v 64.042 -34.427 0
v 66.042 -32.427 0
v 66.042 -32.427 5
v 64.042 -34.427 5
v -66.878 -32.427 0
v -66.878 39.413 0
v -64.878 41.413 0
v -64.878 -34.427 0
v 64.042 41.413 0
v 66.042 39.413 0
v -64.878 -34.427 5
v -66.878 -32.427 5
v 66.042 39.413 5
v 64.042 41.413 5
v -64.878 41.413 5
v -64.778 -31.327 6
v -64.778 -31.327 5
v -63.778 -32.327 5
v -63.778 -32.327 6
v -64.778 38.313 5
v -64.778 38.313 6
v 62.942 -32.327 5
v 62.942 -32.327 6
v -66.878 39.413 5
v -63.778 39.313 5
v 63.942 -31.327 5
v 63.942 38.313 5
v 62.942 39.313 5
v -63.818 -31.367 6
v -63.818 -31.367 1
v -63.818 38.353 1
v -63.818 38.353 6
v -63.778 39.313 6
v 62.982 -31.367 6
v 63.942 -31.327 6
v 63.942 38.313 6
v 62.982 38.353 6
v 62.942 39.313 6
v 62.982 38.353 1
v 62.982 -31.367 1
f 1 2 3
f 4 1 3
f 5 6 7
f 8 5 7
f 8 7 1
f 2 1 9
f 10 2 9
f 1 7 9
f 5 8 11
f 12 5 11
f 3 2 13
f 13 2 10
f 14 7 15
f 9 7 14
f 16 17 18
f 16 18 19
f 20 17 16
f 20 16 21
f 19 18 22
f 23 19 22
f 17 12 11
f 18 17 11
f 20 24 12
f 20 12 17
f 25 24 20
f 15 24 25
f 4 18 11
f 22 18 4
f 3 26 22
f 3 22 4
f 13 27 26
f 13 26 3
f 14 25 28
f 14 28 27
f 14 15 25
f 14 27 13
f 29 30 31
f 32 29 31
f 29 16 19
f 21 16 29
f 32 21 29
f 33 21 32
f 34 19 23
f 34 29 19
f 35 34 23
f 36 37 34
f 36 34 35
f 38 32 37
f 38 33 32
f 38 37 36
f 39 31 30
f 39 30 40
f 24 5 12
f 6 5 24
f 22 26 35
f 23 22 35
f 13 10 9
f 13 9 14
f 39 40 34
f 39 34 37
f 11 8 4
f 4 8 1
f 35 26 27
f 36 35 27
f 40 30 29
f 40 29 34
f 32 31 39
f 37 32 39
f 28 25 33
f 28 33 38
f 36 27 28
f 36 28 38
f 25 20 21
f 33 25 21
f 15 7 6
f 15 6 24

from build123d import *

# Parameters (mm, degrees)
F0_W     = 128.72
F0_H     = 71.64
F0_W_2   = 126.8
F0_H_2   = 69.72
F1_DEPTH = 6
F0_W_3   = 132.92
F0_H_3   = 75.84
F2_DEPTH = 5
F3_DEPTH = 1
F5_SIZE  = 1
F6_SIZE  = 2


with BuildPart() as f1:
    # F0 (on Top) → F1 (new body)
    with BuildSketch(Plane.XY):
        with Locations((9.5820501447, 3.493278903)):
            Rectangle(F0_W, F0_H)
        with Locations((9.5820501447, 3.493278903)):
            Rectangle(F0_W_2, F0_H_2, mode=Mode.SUBTRACT)
    extrude(amount=F1_DEPTH)

    # F0 (on Top) → F2 (join)
    with BuildSketch(Plane.XY):
        with Locations((9.5820501447, 3.493278903)):
            Rectangle(F0_W_3, F0_H_3)
        with Locations((9.5820501447, 3.493278903)):
            Rectangle(F0_W, F0_H, mode=Mode.SUBTRACT)
    extrude(amount=F2_DEPTH)

    # F0 (on Top) → F3 (join)
    with BuildSketch(Plane.XY):
        with Locations((9.5820501447, 3.493278903)):
            Rectangle(F0_W_2, F0_H_2)
    extrude(amount=F3_DEPTH)


with BuildPart() as f1_1:
    # F4: moved
    add(f1.part.moved(Location((-10, 0, 0))))

    # F5
    f5_edges = [f1_1.edges().sort_by_distance(p)[0] for p in [
        (-64.77795, -32.326721, 5.5),
        (63.94205, -32.326721, 5.5),
        (63.94205, 39.313279, 5.5),
        (-64.77795, 39.313279, 5.5),
    ]]
    chamfer(f5_edges, length=F5_SIZE)

    # F6
    f6_edges = [f1_1.edges().sort_by_distance(p)[0] for p in [
        (-66.87795, 41.413279, 2.5),
        (-66.87795, -34.426721, 2.5),
        (66.04205, -34.426721, 2.5),
        (66.04205, 41.413279, 2.5),
    ]]
    chamfer(f6_edges, length=F6_SIZE)


solid = f1_1.part
